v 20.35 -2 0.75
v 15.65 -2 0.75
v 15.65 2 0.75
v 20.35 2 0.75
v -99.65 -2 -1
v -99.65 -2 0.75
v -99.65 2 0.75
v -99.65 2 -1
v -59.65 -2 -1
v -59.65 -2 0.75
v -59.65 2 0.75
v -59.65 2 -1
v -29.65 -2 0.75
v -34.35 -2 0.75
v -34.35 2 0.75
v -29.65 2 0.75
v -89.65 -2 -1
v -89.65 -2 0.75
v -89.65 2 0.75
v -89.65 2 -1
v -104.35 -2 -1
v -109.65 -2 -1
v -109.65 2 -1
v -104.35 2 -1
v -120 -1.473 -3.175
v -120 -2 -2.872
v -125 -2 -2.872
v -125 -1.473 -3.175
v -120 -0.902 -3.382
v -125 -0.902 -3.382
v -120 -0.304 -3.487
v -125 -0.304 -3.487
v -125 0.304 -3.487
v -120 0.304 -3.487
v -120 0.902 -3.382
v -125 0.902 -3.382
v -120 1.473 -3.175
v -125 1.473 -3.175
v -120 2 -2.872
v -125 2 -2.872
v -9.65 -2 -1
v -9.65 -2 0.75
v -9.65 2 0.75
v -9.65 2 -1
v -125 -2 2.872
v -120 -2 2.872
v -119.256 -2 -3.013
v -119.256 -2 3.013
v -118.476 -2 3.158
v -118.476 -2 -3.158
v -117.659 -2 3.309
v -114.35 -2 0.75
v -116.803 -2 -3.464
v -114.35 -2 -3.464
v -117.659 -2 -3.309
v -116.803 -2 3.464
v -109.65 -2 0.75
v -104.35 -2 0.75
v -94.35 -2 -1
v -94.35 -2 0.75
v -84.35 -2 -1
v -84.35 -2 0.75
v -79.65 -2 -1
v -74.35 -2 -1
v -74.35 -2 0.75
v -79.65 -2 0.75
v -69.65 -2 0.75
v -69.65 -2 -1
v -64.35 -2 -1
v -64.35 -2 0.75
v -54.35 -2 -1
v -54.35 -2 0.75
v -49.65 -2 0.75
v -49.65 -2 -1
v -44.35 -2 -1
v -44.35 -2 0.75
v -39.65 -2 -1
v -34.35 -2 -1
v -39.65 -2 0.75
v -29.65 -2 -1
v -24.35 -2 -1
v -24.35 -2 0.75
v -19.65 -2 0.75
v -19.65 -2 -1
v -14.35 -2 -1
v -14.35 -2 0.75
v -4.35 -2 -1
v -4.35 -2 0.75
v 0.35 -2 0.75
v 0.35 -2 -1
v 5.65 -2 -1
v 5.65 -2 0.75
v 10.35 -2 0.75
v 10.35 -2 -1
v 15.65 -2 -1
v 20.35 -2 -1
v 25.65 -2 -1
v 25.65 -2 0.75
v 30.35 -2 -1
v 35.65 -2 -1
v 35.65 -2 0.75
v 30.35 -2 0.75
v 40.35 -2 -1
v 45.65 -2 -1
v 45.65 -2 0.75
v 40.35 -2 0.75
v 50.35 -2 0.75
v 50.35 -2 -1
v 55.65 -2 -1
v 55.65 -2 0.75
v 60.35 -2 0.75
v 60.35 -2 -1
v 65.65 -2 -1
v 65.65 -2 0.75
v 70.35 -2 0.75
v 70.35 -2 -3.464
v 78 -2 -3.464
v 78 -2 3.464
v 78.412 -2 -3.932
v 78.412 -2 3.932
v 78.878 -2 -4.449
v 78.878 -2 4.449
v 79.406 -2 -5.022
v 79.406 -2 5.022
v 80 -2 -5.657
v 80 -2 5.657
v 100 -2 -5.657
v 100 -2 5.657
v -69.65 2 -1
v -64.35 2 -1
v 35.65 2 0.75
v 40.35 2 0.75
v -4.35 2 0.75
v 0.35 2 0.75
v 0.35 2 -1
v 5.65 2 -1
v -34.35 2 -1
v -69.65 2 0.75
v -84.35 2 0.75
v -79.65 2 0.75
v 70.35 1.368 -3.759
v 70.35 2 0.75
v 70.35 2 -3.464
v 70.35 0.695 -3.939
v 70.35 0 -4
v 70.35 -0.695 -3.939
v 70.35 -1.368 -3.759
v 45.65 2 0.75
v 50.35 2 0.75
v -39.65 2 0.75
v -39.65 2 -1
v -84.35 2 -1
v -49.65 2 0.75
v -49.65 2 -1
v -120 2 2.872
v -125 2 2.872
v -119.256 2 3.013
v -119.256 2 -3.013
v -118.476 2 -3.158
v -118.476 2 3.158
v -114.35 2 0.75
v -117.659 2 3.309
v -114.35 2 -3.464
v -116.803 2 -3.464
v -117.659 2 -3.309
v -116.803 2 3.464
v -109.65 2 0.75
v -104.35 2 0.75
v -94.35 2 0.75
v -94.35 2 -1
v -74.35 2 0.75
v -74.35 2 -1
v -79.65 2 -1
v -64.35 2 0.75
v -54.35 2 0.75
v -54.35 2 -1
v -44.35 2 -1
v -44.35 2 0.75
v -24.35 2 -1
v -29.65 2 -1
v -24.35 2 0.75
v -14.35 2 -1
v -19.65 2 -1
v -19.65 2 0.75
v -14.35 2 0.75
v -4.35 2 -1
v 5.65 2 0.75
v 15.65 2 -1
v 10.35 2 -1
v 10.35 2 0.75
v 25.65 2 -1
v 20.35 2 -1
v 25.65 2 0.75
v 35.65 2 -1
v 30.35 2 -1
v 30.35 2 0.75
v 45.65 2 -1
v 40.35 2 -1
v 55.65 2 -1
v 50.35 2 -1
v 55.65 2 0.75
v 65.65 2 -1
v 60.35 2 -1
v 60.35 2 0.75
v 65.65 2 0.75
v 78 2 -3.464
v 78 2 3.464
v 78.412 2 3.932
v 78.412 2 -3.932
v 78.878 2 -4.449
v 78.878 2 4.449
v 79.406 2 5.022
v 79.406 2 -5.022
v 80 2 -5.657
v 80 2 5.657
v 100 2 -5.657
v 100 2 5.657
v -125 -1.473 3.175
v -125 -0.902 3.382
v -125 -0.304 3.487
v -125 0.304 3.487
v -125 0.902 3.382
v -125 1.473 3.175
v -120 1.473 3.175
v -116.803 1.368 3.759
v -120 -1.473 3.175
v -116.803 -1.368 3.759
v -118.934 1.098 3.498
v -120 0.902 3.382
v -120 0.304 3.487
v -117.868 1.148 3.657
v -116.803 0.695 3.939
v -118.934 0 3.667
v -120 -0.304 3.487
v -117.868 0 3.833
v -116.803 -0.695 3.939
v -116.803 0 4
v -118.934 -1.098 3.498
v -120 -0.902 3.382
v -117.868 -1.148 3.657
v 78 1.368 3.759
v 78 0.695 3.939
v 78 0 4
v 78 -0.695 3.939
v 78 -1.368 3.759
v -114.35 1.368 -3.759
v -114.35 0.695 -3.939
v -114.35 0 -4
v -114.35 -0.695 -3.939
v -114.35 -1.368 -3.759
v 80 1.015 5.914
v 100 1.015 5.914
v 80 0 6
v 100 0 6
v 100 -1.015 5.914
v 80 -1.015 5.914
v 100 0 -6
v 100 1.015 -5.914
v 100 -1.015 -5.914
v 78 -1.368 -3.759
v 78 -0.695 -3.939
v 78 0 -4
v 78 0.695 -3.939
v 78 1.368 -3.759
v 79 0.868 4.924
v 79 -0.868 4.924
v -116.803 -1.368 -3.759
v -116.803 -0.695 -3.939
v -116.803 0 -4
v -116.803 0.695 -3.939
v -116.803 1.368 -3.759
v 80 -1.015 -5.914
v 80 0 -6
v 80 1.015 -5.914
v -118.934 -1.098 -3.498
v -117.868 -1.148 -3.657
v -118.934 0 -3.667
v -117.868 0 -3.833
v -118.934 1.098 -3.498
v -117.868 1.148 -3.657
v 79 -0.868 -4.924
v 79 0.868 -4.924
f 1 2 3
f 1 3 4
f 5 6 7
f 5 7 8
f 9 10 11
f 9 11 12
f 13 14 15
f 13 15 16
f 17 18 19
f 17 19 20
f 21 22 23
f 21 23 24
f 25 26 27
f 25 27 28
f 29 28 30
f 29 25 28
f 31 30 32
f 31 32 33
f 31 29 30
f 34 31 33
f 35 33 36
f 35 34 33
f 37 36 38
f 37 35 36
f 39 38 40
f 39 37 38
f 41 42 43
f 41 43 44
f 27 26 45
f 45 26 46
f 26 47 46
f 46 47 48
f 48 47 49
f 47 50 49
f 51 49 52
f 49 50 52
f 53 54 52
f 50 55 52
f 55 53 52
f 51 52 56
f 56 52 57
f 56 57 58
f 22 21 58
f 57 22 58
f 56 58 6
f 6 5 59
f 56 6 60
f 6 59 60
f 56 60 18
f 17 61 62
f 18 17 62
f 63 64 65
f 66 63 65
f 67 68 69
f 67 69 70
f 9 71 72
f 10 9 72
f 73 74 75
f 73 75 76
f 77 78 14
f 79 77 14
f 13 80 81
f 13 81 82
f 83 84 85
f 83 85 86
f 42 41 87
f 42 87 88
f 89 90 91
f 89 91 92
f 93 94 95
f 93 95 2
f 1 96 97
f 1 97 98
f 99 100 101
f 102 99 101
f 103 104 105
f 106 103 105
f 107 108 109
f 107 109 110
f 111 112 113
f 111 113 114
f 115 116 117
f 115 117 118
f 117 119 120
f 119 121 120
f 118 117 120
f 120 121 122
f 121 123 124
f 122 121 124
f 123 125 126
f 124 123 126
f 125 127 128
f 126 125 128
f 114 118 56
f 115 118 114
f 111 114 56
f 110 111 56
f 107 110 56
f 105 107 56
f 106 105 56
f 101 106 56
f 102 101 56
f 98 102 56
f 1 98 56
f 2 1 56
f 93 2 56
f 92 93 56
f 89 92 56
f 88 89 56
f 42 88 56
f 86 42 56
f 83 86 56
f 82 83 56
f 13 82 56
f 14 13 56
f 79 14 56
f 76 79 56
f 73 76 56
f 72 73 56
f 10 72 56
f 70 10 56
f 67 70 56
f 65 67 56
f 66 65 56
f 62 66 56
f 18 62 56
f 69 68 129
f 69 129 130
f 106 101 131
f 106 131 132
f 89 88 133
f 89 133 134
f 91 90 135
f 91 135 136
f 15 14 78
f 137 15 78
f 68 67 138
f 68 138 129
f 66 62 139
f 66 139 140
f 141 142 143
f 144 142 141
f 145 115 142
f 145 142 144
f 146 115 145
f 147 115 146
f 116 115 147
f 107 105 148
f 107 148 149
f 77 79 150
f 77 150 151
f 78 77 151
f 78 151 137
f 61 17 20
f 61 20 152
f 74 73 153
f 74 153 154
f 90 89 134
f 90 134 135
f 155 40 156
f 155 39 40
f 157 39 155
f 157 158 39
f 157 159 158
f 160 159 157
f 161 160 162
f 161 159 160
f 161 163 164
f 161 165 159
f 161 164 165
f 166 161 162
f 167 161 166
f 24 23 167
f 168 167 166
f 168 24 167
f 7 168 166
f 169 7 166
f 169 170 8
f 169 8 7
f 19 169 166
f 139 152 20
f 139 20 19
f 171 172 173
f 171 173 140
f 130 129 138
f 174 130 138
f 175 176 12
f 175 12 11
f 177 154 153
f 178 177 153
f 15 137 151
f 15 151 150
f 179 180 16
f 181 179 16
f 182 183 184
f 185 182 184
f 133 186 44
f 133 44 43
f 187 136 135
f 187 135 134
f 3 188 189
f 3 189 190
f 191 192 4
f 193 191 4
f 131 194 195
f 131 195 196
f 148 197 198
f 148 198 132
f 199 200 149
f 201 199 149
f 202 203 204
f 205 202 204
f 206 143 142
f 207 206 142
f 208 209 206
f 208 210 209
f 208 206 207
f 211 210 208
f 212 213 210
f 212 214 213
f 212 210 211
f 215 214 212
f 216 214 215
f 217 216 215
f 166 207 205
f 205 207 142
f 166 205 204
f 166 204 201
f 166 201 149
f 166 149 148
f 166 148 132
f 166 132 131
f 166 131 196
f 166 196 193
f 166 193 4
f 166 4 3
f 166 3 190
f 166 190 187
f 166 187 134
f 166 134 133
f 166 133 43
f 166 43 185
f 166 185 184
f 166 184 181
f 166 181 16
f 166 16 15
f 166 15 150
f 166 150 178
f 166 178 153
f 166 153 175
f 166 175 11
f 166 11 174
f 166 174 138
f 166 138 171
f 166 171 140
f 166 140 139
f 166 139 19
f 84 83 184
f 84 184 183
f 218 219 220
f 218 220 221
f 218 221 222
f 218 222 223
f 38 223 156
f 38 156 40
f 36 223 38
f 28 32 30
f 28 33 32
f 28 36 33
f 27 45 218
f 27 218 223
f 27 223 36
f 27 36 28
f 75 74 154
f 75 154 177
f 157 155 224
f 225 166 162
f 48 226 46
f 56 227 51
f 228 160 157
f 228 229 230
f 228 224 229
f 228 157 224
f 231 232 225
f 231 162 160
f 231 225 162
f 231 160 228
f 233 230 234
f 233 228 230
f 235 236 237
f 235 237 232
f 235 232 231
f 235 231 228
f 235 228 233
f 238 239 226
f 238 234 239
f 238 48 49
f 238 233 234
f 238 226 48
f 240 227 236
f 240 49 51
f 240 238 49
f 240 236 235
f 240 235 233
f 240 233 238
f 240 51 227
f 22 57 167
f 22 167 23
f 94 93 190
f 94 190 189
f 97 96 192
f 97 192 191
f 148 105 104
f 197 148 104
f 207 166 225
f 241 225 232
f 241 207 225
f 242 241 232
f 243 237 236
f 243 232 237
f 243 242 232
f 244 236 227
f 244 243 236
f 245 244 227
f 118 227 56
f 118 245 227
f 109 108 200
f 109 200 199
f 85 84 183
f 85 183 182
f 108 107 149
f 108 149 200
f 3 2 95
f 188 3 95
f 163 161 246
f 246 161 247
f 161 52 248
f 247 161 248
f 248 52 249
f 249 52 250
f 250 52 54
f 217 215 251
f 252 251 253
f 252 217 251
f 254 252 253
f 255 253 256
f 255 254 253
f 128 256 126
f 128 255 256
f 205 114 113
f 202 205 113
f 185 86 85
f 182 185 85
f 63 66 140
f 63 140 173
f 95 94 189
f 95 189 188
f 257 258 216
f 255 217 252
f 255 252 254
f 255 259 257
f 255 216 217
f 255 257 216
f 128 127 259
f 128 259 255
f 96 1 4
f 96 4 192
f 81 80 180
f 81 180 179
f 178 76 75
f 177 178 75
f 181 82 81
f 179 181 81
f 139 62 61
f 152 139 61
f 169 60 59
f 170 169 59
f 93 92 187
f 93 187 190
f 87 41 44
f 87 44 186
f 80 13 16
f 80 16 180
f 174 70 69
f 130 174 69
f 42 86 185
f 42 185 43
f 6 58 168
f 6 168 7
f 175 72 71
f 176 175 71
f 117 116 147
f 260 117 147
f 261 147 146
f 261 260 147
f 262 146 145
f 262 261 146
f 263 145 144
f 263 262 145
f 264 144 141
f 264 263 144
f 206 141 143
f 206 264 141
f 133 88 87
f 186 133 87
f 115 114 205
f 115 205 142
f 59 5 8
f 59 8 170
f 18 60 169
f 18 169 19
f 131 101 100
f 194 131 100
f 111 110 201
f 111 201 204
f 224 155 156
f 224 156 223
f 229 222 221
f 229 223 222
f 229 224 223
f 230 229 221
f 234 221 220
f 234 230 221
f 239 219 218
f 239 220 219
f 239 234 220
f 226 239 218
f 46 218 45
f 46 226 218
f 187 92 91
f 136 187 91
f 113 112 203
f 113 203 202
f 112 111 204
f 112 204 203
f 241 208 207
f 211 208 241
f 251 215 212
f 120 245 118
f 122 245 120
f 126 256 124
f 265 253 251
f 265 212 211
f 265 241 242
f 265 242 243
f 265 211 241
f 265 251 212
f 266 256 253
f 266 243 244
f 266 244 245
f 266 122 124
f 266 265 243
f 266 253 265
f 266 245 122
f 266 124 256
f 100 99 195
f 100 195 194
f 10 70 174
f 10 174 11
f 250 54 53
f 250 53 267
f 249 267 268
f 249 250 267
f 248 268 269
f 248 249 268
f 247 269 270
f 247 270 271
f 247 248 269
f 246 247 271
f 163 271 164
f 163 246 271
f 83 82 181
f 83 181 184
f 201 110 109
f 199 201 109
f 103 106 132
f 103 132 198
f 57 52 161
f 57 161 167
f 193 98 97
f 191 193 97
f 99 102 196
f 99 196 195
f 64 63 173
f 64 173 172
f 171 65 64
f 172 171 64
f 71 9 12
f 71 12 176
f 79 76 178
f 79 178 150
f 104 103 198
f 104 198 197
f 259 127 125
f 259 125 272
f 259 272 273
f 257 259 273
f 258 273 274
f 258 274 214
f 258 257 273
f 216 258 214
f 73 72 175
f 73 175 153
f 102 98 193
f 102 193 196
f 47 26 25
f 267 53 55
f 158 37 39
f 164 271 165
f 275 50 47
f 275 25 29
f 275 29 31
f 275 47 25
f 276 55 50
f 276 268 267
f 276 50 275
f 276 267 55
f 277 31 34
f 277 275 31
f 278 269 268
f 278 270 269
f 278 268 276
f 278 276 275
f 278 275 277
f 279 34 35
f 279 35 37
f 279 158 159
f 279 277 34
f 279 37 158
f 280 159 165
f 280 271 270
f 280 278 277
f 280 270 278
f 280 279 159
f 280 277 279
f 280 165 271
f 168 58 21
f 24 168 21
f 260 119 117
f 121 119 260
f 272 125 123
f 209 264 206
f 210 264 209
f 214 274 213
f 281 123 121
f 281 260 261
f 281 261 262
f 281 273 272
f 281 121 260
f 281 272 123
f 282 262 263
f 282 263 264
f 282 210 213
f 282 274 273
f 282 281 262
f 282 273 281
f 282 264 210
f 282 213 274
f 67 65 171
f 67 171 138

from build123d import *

# Parameters (mm, degrees)
CUT_EXTRUDE1_DEPTH      = 126.287668986
CUT_EXTRUDE1_DEPTH_BACK = 126.287668986
SKETCH3_W               = 4.7
SKETCH3_H               = 4.75
CUT_EXTRUDE2_DEPTH      = 126.287668986
CUT_EXTRUDE2_DEPTH_BACK = 126.287668986
SKETCH4_W               = 184.7
SKETCH4_H               = 3
CUT_EXTRUDE4_DEPTH      = 226.159943152
CUT_EXTRUDE4_DEPTH_BACK = 226.159943152
SKETCH5_W               = 15.463728056
SKETCH5_H               = 5.091329687
SKETCH5_H_2             = 5.301676888


with BuildPart() as part:
    # Sketch1 → Revolve1 (revolve)
    with BuildSketch(Plane(origin=(0, 0, 0), x_dir=(1, 0, 0), z_dir=(0, 1, 0)), mode=Mode.PRIVATE) as revolve1_sk:
        Polygon((-125, 0), (-125, 3.5), (-120, 3.5), (-116.802652106, 4), (78, 4), (80, 6), (100, 6), (100, 0), align=None)
    revolve(revolve1_sk.sketch.rotate(Axis((-125, 0, 0), (1, 0, 0)), 180), axis=Axis((-125, 0, 0), (1, 0, 0)))

    # Sketch3 → Cut-Extrude1 (cut, two sides: drawn at the far end of the back side and taken through both)
    with BuildSketch(Plane(origin=(0, 0, 0), x_dir=(1, 0, 0), z_dir=(0, 1, 0)).offset(-CUT_EXTRUDE1_DEPTH_BACK)):
        with Locations((-112, 1.625)):
            Rectangle(SKETCH3_W, SKETCH3_H)
        with Locations((-102, 1.625)):
            Rectangle(SKETCH3_W, SKETCH3_H)
        with Locations((-92, 1.625)):
            Rectangle(SKETCH3_W, SKETCH3_H)
        with Locations((-82, 1.625)):
            Rectangle(SKETCH3_W, SKETCH3_H)
        with Locations((-72, 1.625)):
            Rectangle(SKETCH3_W, SKETCH3_H)
        with Locations((-62, 1.625)):
            Rectangle(SKETCH3_W, SKETCH3_H)
        with Locations((-52, 1.625)):
            Rectangle(SKETCH3_W, SKETCH3_H)
        with Locations((-42, 1.625)):
            Rectangle(SKETCH3_W, SKETCH3_H)
        with Locations((-32, 1.625)):
            Rectangle(SKETCH3_W, SKETCH3_H)
        with Locations((-22, 1.625)):
            Rectangle(SKETCH3_W, SKETCH3_H)
        with Locations((-12, 1.625)):
            Rectangle(SKETCH3_W, SKETCH3_H)
        with Locations((-2, 1.625)):
            Rectangle(SKETCH3_W, SKETCH3_H)
        with Locations((8, 1.625)):
            Rectangle(SKETCH3_W, SKETCH3_H)
        with Locations((18, 1.625)):
            Rectangle(SKETCH3_W, SKETCH3_H)
        with Locations((28, 1.625)):
            Rectangle(SKETCH3_W, SKETCH3_H)
        with Locations((38, 1.625)):
            Rectangle(SKETCH3_W, SKETCH3_H)
        with Locations((48, 1.625)):
            Rectangle(SKETCH3_W, SKETCH3_H)
        with Locations((58, 1.625)):
            Rectangle(SKETCH3_W, SKETCH3_H)
        with Locations((68, 1.625)):
            Rectangle(SKETCH3_W, SKETCH3_H)
    extrude(amount=CUT_EXTRUDE1_DEPTH + CUT_EXTRUDE1_DEPTH_BACK, mode=Mode.SUBTRACT)

    # Sketch4 → Cut-Extrude2 (cut, two sides: drawn at the far end of the back side and taken through both)
    with BuildSketch(Plane(origin=(0, 0, 0), x_dir=(1, 0, 0), z_dir=(0, 1, 0)).offset(-CUT_EXTRUDE2_DEPTH_BACK)):
        with Locations((-22, 2.5)):
            Rectangle(SKETCH4_W, SKETCH4_H)
    extrude(amount=CUT_EXTRUDE2_DEPTH + CUT_EXTRUDE2_DEPTH_BACK, mode=Mode.SUBTRACT)

    # Sketch5 → Cut-Extrude4 (cut, two sides: drawn at the far end of the back side and taken through both)
    with BuildSketch(Plane.ZY.offset(125).offset(-CUT_EXTRUDE4_DEPTH_BACK)):
        with Locations((0.057906168, -4.545664844)):
            Rectangle(SKETCH5_W, SKETCH5_H)
        with Locations((0.057906168, 4.650838444)):
            Rectangle(SKETCH5_W, SKETCH5_H_2)
    extrude(amount=CUT_EXTRUDE4_DEPTH + CUT_EXTRUDE4_DEPTH_BACK, mode=Mode.SUBTRACT)


solid = part.part
